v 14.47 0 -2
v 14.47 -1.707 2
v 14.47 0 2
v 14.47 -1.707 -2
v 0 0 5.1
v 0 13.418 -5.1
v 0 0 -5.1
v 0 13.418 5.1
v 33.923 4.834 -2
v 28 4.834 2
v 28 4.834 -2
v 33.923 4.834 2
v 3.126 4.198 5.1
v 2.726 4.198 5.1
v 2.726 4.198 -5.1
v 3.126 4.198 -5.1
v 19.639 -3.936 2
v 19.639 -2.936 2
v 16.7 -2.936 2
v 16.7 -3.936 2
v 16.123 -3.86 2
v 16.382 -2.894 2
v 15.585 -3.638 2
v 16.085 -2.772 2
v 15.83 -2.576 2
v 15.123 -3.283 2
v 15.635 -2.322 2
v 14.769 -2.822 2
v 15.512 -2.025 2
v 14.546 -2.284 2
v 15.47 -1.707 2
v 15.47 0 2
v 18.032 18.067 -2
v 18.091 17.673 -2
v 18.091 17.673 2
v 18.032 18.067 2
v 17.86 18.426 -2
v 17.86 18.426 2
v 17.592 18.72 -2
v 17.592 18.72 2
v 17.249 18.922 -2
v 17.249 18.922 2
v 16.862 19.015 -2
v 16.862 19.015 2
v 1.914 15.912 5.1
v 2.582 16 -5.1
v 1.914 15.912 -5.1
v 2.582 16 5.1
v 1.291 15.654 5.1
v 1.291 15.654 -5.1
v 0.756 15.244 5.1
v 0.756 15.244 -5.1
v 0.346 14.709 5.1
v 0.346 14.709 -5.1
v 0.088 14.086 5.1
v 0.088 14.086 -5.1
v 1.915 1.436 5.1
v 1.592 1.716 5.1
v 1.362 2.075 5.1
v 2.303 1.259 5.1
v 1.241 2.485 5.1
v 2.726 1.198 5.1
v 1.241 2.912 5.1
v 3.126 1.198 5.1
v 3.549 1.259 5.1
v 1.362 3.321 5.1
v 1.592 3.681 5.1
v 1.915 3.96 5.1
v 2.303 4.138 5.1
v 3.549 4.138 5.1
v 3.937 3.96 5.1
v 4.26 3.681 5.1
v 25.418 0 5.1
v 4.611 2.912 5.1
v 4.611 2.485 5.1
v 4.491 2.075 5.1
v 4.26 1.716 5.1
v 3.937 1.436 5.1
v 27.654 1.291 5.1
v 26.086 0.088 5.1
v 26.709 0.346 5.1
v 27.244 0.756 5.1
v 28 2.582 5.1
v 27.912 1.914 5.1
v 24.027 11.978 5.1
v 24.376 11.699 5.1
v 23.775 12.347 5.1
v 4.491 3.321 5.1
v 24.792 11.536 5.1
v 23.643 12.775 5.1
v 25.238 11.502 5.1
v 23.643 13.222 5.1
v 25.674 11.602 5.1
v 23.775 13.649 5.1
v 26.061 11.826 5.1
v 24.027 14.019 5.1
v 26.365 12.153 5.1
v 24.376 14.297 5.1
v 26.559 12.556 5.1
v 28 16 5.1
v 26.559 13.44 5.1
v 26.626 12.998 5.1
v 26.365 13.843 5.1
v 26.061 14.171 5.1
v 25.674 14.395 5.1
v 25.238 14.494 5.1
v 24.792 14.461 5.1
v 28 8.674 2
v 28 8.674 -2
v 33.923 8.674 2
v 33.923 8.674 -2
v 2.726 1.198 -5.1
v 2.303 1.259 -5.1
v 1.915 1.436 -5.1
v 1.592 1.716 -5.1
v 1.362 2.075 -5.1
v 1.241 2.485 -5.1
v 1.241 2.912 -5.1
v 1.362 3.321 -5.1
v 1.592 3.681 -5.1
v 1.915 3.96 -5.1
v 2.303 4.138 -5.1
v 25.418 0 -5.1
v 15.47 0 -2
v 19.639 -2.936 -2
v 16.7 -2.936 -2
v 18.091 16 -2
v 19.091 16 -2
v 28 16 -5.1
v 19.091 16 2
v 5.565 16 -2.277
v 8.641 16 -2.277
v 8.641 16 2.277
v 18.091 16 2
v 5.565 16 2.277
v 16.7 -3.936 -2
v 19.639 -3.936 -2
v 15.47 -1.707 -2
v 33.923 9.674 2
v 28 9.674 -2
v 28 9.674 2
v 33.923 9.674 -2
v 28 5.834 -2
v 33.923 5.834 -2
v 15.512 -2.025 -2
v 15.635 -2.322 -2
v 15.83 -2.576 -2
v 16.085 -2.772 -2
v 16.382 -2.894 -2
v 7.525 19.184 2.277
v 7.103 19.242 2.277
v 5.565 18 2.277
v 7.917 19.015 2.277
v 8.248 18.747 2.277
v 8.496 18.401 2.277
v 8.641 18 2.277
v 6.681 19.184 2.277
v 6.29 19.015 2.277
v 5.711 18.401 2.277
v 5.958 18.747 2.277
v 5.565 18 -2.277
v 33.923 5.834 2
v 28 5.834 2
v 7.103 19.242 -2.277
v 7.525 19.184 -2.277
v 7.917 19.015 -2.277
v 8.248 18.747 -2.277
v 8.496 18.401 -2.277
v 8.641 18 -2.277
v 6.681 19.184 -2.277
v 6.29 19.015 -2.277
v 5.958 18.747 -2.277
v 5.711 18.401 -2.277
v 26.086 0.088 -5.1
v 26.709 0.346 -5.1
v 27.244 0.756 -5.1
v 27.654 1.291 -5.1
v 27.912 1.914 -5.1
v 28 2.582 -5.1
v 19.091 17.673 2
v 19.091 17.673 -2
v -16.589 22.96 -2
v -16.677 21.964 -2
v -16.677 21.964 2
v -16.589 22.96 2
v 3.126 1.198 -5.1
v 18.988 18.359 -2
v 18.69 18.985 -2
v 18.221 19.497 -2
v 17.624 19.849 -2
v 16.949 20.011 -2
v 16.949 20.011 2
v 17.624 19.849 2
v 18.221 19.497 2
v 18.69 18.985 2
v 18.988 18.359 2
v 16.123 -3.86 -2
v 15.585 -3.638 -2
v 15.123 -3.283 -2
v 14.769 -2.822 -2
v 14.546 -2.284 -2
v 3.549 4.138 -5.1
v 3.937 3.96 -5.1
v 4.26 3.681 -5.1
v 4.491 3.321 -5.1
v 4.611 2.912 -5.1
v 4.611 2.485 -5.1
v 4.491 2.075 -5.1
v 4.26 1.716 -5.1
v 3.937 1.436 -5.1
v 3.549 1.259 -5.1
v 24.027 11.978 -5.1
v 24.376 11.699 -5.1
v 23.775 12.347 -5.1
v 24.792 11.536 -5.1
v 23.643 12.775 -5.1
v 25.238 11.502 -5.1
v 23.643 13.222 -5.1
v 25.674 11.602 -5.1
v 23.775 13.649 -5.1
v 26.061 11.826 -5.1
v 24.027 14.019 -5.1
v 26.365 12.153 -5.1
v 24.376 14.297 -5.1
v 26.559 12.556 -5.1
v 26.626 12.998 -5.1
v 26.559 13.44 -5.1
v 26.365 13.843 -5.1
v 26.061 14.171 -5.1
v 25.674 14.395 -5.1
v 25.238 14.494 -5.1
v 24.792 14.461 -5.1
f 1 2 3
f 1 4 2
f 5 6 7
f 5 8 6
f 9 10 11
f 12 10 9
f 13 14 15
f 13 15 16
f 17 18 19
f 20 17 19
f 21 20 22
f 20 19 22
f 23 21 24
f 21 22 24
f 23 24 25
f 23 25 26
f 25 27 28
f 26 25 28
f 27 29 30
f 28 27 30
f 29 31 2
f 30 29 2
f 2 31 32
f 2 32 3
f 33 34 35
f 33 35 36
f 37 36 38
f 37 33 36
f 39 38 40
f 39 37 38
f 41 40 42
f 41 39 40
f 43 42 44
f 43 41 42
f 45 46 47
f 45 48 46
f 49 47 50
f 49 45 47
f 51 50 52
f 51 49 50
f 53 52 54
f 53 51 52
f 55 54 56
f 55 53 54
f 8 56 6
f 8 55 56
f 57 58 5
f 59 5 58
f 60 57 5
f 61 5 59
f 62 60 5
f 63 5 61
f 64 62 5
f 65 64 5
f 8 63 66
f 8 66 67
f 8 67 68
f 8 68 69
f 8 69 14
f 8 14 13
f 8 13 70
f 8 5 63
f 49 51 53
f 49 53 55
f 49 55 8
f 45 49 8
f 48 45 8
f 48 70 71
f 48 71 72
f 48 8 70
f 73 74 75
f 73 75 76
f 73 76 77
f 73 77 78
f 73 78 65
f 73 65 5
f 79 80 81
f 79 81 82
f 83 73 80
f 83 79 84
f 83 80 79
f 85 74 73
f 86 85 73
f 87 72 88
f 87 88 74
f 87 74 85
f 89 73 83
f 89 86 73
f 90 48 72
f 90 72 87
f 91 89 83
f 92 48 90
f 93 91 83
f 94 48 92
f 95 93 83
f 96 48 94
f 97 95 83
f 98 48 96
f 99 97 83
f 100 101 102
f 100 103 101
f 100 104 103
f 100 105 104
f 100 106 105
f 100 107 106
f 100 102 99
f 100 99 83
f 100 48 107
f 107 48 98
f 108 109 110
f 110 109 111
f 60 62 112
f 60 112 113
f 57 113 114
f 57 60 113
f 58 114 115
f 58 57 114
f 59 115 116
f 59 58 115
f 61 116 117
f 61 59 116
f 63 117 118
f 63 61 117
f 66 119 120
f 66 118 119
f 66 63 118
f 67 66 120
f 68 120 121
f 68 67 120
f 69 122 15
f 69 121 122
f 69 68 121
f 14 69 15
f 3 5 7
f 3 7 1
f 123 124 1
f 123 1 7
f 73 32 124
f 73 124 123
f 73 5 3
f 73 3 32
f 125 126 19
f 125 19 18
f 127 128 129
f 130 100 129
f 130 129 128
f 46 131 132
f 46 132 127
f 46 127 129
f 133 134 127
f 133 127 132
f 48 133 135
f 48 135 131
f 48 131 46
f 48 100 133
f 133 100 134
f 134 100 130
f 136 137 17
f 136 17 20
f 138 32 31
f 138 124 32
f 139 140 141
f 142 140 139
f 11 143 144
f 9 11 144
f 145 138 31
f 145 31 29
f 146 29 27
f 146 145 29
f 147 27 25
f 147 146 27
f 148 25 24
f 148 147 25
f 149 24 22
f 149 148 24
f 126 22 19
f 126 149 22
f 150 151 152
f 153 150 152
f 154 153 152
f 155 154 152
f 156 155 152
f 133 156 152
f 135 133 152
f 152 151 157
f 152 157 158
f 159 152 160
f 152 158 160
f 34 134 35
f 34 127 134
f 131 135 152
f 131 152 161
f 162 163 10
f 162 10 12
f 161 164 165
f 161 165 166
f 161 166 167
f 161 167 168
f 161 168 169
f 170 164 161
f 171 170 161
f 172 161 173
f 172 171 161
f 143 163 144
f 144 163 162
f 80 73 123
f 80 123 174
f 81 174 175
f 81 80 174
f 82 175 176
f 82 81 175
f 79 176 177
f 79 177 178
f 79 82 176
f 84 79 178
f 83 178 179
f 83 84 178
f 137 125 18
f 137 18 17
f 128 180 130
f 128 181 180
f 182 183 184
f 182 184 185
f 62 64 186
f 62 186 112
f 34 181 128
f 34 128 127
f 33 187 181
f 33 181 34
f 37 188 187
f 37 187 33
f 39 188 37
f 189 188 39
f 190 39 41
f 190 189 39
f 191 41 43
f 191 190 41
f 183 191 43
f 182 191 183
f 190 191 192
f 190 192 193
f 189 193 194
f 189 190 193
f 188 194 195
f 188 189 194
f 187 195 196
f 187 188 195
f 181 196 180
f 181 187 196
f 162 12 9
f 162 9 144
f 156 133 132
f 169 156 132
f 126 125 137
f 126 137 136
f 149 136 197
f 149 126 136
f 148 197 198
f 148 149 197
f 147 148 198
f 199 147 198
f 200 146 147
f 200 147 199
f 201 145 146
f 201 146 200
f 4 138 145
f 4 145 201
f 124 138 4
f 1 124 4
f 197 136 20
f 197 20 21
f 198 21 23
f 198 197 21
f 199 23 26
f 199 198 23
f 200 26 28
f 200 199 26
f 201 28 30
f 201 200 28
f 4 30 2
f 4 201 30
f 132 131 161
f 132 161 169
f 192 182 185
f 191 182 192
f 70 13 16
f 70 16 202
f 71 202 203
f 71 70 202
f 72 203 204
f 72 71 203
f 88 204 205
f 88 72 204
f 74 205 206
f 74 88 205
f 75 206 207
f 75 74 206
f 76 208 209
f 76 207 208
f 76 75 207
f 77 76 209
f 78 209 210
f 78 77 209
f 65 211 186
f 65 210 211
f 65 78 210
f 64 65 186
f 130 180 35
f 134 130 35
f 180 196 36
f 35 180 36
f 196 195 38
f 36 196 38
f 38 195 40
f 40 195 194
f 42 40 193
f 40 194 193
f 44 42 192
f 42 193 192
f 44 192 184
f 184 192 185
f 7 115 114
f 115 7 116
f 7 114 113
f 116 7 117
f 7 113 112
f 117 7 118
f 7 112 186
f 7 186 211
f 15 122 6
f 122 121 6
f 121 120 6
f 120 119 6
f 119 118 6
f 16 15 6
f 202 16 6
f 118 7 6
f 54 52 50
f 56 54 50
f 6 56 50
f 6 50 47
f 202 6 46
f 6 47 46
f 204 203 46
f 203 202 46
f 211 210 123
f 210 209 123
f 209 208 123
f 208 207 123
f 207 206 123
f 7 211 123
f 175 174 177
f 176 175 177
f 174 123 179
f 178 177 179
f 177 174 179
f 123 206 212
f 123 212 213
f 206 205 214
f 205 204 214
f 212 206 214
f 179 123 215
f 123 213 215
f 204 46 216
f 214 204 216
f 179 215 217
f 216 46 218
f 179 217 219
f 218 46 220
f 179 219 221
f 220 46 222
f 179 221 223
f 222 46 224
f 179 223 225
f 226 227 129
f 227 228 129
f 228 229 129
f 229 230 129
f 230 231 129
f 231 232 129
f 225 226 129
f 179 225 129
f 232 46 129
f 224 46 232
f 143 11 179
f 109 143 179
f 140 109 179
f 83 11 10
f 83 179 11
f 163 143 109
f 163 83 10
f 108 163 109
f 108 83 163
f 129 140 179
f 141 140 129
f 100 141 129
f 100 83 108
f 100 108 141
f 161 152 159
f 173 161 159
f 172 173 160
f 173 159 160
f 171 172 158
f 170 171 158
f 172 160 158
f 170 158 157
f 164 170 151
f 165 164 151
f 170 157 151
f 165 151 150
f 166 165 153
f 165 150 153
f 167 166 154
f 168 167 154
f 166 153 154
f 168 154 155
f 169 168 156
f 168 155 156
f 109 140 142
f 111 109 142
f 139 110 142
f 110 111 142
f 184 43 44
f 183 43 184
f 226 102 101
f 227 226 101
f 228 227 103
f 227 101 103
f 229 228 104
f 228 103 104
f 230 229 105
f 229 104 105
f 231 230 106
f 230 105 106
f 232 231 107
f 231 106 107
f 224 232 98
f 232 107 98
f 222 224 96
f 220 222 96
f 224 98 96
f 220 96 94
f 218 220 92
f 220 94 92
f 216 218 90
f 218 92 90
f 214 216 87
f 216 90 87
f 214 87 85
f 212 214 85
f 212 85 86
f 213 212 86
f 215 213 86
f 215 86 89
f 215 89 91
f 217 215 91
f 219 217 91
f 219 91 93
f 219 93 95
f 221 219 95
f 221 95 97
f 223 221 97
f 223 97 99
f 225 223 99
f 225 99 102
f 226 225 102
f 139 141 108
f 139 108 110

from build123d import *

# Parameters (mm, degrees)
BOSS_EXTRUDE1_DEPTH = 5.1
SKETCH2_R           = 1.5
CUT_EXTRUDE1_DEPTH  = 11.2
SKETCH3_W           = 3.075451665
SKETCH3_H           = 4.554021572
BOSS_EXTRUDE2_DEPTH = 2
BOSS_EXTRUDE3_DEPTH = 4.554022
SKETCH5_W           = 5.923073673
SKETCH5_H           = 1
EXTRUDE_THIN1_DEPTH = 2


with BuildPart() as part:
    # Sketch1 → Boss-Extrude1 (new body, symmetric)
    with BuildSketch(Plane.XY):
        with BuildLine():
            Line((0, 0), (25.41820823, 0))
            ThreePointArc((25.41820823, 0), (27.243810698, 0.756189302), (28, 2.58179177))
            Line((28, 2.58179177), (28, 16))
            Line((28, 16), (2.58179177, 16))
            ThreePointArc((2.58179177, 16), (0.756189302, 15.243810698), (0, 13.41820823))
            Line((0, 13.41820823), (0, 0))
        make_face()
    extrude(amount=BOSS_EXTRUDE1_DEPTH, both=True)

    # Sketch2 → Cut-Extrude1 (cut, through all)
    with BuildSketch(Plane.XY.offset(5.1)):
        with Locations((25.126078894, 12.998288548)):
            Circle(SKETCH2_R)
        with BuildLine():
            Line((2.726078894, 4.198288548), (3.126078894, 4.198288548))
            ThreePointArc((3.126078894, 4.198288548), (4.626078894, 2.698288548), (3.126078894, 1.198288548))
            Line((3.126078894, 1.198288548), (2.726078894, 1.198288548))
            ThreePointArc((2.726078894, 1.198288548), (1.226078894, 2.698288548), (2.726078894, 4.198288548))
        make_face()
    extrude(amount=-CUT_EXTRUDE1_DEPTH, mode=Mode.SUBTRACT)

    # Sketch3 → Boss-Extrude2 (add)
    with BuildSketch(Plane(origin=(0, 16, 0), x_dir=(1, 0, 0), z_dir=(0, 1, 0))):
        with Locations((7.103184887, 0)):
            Rectangle(SKETCH3_W, SKETCH3_H)
    extrude(amount=BOSS_EXTRUDE2_DEPTH)

    # Sketch4 → Boss-Extrude3 (add)
    with BuildSketch(Plane(origin=(0, 0, 2.277010786), x_dir=(-1, 0, 0), z_dir=(0, 0, -1))):
        with BuildLine():
            Line((-8.640910719, 18), (-5.565459054, 18))
            ThreePointArc((-5.565459054, 18), (-7.103184886, 19.241645654), (-8.640910719, 18))
        make_face()
    extrude(amount=BOSS_EXTRUDE3_DEPTH)

    # Sketch5 → Extrude-Thin1 (add, symmetric)
    with BuildSketch(Plane.XY):
        with BuildLine():
            Line((18.090606696, 16), (18.090606696, 17.673346876))
            ThreePointArc((18.090606696, 17.673346876), (17.736957385, 18.583040478), (16.861731376, 19.015000796))
            Line((16.861731376, 19.015000796), (-16.676926327, 21.963605838))
            Line((-16.676926327, 21.963605838), (-16.58934753, 22.959763433))
            Line((-16.58934753, 22.959763433), (16.949310173, 20.011158391))
            ThreePointArc((16.949310173, 20.011158391), (18.474378159, 19.258474117), (19.090606696, 17.673346876))
            Line((19.090606696, 17.673346876), (19.090606696, 16))
            Line((19.090606696, 16), (18.090606696, 16))
        make_face()
        with BuildLine():
            Line((15.470256996, 0), (15.470256996, -1.706861363))
            ThreePointArc((15.470256996, -1.706861363), (15.830378815, -2.576272343), (16.699789795, -2.936394162))
            Line((16.699789795, -2.936394162), (19.638532844, -2.936394162))
            Line((19.638532844, -2.936394162), (19.638532844, -3.936394162))
            Line((19.638532844, -3.936394162), (16.699789795, -3.936394162))
            ThreePointArc((16.699789795, -3.936394162), (15.123272034, -3.283379124), (14.470256996, -1.706861363))
            Line((14.470256996, -1.706861363), (14.470256996, 0))
            Line((14.470256996, 0), (15.470256996, 0))
        make_face()
        with Locations((30.961536837, 9.17393674)):
            Rectangle(SKETCH5_W, SKETCH5_H)
        with Locations((30.961536837, 5.333502812)):
            Rectangle(SKETCH5_W, SKETCH5_H)
    extrude(amount=EXTRUDE_THIN1_DEPTH, both=True)


solid = part.part
